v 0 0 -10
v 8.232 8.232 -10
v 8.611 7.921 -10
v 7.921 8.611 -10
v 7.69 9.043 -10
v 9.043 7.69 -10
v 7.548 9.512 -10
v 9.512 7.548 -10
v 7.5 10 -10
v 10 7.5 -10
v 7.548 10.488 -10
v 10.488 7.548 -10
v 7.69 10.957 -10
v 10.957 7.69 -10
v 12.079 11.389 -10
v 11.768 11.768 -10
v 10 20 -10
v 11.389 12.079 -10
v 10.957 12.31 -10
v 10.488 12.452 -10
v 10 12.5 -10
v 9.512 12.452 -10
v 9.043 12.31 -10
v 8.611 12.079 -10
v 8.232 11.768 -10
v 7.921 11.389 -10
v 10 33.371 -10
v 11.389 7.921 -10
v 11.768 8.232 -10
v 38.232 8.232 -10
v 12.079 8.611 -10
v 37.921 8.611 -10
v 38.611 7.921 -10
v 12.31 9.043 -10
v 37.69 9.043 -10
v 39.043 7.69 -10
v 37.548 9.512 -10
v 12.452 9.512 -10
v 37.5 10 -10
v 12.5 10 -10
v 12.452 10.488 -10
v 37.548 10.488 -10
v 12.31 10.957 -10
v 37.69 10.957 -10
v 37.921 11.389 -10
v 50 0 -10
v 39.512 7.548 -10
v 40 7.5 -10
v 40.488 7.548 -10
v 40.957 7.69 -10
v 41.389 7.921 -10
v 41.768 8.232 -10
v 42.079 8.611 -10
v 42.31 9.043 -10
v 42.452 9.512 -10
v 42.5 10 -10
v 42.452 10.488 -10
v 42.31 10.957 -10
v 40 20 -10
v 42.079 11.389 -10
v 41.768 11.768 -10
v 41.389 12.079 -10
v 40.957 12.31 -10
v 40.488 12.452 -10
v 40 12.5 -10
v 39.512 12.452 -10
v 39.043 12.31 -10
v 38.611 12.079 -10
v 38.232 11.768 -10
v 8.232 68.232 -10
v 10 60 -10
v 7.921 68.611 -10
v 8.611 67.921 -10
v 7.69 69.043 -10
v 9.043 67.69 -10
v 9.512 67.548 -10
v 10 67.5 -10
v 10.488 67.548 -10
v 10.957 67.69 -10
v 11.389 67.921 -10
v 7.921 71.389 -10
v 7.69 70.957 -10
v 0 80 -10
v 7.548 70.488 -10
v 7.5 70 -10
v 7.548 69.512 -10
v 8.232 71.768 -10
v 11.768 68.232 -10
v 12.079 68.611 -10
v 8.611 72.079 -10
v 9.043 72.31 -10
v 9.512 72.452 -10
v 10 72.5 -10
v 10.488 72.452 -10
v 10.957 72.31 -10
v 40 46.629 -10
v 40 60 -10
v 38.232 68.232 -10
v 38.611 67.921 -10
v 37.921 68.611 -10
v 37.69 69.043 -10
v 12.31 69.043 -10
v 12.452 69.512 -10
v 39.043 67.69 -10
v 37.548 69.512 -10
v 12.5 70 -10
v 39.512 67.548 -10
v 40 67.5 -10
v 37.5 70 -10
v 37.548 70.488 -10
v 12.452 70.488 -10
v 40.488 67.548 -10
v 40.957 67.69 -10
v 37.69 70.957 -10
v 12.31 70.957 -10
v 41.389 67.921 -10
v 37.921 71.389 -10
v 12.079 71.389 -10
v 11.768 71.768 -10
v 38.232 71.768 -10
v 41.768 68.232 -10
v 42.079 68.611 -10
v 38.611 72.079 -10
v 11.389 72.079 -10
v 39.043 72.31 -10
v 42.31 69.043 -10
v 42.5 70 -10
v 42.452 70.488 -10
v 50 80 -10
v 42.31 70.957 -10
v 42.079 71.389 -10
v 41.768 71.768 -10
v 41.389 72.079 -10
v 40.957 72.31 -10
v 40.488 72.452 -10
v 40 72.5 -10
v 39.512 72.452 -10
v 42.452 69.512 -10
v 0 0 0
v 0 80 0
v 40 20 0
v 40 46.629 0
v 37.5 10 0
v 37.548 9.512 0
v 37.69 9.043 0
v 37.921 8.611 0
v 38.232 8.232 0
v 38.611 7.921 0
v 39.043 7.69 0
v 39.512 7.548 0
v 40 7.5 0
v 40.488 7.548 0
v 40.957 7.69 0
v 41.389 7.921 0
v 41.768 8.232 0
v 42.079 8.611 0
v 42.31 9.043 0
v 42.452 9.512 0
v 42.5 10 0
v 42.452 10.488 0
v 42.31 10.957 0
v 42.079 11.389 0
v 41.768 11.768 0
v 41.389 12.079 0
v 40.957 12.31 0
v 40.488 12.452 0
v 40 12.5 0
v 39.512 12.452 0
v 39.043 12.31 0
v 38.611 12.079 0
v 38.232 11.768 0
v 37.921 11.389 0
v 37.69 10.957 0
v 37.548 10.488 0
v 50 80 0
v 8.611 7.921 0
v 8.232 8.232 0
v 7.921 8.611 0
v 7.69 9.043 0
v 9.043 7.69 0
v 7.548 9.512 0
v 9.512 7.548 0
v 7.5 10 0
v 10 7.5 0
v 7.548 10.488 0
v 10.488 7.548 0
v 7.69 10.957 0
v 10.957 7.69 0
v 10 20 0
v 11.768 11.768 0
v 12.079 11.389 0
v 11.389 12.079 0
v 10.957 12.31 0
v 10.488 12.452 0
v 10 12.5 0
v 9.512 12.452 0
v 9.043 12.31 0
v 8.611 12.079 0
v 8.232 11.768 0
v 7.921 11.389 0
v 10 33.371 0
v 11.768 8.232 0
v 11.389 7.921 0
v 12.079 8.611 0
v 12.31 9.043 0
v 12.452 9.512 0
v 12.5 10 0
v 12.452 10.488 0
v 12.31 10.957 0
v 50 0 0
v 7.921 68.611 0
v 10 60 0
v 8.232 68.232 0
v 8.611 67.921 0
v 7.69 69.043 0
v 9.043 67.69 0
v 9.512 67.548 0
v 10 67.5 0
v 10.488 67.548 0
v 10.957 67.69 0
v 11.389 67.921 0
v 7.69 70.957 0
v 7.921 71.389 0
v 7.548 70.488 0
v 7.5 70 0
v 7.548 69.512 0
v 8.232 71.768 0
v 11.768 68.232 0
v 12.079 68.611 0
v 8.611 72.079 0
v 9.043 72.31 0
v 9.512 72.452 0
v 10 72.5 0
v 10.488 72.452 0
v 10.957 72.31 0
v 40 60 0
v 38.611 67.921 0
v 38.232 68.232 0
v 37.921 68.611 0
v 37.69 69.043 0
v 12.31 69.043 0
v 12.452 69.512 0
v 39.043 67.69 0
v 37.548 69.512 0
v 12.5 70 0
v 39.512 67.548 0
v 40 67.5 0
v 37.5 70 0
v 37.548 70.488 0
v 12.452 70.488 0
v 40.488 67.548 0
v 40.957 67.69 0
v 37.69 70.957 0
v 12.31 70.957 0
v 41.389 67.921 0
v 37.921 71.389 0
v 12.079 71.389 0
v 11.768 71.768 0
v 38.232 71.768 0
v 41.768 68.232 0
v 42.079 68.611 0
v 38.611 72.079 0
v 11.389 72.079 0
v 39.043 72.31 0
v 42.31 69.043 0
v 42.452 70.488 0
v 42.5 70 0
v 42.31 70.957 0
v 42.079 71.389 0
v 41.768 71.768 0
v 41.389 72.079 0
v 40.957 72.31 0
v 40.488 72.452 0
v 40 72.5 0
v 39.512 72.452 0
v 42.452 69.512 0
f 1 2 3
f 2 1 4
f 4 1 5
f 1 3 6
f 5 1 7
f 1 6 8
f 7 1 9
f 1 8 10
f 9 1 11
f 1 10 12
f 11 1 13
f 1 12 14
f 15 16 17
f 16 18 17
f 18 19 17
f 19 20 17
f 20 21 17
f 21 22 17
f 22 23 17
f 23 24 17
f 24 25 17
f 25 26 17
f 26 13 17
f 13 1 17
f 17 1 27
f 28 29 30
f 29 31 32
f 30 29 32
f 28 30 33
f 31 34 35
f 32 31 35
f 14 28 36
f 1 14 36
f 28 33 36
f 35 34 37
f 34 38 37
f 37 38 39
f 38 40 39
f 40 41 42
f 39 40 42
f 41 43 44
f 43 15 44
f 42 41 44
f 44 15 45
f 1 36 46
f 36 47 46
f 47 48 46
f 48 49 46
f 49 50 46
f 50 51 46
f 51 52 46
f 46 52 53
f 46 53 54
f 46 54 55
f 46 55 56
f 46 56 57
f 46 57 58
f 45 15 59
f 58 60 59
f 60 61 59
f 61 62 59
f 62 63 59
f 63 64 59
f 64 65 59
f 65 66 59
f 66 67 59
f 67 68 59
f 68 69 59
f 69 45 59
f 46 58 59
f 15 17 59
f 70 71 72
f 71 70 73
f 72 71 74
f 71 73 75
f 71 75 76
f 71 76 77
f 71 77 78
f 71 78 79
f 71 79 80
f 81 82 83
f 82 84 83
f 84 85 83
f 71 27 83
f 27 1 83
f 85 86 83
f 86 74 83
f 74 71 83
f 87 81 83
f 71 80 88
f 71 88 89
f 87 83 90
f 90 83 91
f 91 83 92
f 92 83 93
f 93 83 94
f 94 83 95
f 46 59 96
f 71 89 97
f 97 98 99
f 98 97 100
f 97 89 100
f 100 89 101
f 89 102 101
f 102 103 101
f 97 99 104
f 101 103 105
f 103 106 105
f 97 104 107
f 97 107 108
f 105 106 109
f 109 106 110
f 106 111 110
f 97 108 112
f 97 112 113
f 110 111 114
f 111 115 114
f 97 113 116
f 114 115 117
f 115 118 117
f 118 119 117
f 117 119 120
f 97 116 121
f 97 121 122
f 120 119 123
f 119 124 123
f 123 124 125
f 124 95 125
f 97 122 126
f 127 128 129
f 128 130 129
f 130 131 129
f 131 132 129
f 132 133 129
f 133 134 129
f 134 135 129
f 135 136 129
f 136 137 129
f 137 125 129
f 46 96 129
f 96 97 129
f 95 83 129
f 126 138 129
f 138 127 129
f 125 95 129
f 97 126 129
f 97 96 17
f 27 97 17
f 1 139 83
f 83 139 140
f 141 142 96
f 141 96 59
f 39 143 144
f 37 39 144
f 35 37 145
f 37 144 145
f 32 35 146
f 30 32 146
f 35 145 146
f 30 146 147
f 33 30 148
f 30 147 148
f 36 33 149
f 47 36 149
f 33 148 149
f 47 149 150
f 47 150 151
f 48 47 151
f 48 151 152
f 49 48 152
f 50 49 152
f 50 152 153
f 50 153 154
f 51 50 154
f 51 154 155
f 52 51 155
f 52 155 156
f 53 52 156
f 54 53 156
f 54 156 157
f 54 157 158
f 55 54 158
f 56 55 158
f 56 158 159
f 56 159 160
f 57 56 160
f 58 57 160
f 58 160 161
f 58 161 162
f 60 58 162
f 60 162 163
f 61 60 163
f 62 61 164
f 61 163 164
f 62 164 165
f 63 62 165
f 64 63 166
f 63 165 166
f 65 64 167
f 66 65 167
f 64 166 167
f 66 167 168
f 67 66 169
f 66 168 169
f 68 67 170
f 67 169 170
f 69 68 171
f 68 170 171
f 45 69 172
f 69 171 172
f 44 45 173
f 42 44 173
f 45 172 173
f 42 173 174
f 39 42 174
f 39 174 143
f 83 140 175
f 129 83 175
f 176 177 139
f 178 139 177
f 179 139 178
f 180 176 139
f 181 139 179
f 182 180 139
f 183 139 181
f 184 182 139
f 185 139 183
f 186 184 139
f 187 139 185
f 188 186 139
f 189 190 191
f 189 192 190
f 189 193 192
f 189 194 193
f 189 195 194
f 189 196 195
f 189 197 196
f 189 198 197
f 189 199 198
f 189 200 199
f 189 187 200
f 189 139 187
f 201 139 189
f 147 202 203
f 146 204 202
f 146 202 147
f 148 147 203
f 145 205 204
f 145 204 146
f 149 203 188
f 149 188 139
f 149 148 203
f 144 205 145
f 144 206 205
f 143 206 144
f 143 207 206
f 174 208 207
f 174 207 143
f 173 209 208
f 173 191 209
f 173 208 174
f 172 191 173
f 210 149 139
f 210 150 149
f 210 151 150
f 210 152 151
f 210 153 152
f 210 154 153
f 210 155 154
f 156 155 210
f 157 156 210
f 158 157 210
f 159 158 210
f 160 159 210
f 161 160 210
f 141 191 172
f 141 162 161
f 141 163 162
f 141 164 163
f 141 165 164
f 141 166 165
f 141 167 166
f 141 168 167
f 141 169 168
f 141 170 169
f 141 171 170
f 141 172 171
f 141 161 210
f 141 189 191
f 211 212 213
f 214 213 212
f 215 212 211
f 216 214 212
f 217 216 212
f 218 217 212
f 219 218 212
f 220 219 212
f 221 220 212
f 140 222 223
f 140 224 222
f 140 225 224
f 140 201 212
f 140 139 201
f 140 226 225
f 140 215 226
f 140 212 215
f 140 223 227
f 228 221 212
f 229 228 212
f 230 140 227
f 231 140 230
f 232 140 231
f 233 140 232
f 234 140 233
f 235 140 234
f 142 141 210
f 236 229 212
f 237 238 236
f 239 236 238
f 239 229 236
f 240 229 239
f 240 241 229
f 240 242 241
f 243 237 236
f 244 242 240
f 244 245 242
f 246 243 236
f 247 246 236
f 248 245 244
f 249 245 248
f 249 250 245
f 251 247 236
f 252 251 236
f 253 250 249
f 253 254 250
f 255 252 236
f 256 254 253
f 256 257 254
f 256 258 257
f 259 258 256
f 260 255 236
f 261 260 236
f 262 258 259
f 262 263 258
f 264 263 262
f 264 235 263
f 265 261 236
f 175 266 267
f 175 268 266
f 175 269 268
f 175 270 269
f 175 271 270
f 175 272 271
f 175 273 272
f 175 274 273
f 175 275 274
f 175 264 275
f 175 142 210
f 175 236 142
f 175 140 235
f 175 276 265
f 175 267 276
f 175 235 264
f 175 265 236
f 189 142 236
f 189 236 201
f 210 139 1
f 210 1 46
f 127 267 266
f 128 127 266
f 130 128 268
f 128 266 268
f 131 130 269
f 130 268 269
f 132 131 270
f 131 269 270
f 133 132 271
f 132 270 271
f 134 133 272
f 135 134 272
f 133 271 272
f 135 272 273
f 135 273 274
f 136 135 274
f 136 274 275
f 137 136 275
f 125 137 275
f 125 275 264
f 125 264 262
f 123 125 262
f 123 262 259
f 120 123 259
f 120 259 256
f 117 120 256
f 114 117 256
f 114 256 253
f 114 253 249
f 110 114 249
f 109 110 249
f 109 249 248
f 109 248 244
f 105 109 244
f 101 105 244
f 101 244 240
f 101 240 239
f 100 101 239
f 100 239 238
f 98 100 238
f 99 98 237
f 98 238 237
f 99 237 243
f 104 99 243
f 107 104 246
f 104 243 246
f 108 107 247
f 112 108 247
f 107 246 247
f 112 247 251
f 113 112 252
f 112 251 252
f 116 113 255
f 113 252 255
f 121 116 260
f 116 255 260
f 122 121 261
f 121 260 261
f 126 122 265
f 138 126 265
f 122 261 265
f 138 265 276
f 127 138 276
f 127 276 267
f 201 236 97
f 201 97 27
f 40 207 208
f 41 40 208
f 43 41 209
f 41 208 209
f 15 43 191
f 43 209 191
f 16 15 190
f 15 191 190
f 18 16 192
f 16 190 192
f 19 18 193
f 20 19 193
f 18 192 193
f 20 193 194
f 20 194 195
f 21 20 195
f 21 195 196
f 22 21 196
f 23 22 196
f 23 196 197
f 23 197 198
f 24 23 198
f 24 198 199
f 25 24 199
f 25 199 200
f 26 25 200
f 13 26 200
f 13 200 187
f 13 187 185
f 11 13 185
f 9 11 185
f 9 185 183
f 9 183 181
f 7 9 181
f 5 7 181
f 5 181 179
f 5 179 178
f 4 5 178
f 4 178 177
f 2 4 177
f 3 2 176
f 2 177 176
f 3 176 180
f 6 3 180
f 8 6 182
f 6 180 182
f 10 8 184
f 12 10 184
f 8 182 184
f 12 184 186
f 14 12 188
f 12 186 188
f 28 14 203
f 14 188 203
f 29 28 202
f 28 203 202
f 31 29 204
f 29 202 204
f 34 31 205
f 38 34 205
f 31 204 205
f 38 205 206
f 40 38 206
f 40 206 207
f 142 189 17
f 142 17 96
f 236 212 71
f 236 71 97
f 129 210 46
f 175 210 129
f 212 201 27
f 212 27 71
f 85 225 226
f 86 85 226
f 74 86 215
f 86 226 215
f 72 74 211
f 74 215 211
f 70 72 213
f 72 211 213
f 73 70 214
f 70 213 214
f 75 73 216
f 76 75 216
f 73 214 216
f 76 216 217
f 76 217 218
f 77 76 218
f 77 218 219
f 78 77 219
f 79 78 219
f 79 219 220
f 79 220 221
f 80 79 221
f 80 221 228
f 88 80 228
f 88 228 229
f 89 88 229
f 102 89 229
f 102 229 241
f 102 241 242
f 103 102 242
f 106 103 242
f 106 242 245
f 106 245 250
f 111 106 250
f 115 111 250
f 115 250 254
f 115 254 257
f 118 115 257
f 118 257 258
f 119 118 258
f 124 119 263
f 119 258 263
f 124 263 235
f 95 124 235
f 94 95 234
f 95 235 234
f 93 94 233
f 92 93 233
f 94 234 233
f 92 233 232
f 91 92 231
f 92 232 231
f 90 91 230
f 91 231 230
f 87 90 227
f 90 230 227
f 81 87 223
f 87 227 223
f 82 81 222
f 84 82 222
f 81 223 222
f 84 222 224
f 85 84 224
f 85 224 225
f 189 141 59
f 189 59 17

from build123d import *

# Parameters (mm, degrees)
SKETCH1_W          = 50
SKETCH1_H          = 80
BASE_FLANGE1_DEPTH = 10
CUT_EXTRUDE1_REACH = 96.868
SKETCH6_R          = 2.5


# Sheet-metal steps are written as plain solids
with BuildPart() as part:
    # Sketch1 → Base-Flange1 (new body)
    with BuildSketch(Plane.XY):
        with Locations((25, 40)):
            Rectangle(SKETCH1_W, SKETCH1_H)
    extrude(amount=-BASE_FLANGE1_DEPTH)

    # Sketch6 → Cut-Extrude1 (cut, up to next)
    with BuildSketch(Plane.XY, mode=Mode.PRIVATE) as cut_extrude1_sk1:
        with Locations((40, 70)):
            Circle(SKETCH6_R)
    cut_extrude1_tool1 = extrude(cut_extrude1_sk1.sketch, amount=-CUT_EXTRUDE1_REACH, mode=Mode.PRIVATE) & part.part
    # Sketch6 → Cut-Extrude1 (cut, up to next)
    with BuildSketch(Plane.XY, mode=Mode.PRIVATE) as cut_extrude1_sk2:
        with Locations((10, 10)):
            Circle(SKETCH6_R)
    cut_extrude1_tool2 = extrude(cut_extrude1_sk2.sketch, amount=-CUT_EXTRUDE1_REACH, mode=Mode.PRIVATE) & part.part
    # Sketch6 → Cut-Extrude1 (cut, up to next)
    with BuildSketch(Plane.XY, mode=Mode.PRIVATE) as cut_extrude1_sk3:
        with Locations(Location((10, 70, 0), (0, 0, 180))):
            Circle(SKETCH6_R)
    cut_extrude1_tool3 = extrude(cut_extrude1_sk3.sketch, amount=-CUT_EXTRUDE1_REACH, mode=Mode.PRIVATE) & part.part
    # Sketch6 → Cut-Extrude1 (cut, up to next)
    with BuildSketch(Plane.XY, mode=Mode.PRIVATE) as cut_extrude1_sk4:
        with Locations(Location((40, 10, 0), (0, 0, 180))):
            Circle(SKETCH6_R)
    cut_extrude1_tool4 = extrude(cut_extrude1_sk4.sketch, amount=-CUT_EXTRUDE1_REACH, mode=Mode.PRIVATE) & part.part
    # Sketch6 → Cut-Extrude1 (cut, up to next)
    with BuildSketch(Plane.XY, mode=Mode.PRIVATE) as cut_extrude1_sk5:
        Polygon((40, 46.628826929), (40, 20), (10, 20), align=None)
    cut_extrude1_tool5 = extrude(cut_extrude1_sk5.sketch, amount=-CUT_EXTRUDE1_REACH, mode=Mode.PRIVATE) & part.part
    # Sketch6 → Cut-Extrude1 (cut, up to next)
    with BuildSketch(Plane.XY, mode=Mode.PRIVATE) as cut_extrude1_sk6:
        Polygon((40, 60), (10, 33.371173071), (10, 60), align=None)
    cut_extrude1_tool6 = extrude(cut_extrude1_sk6.sketch, amount=-CUT_EXTRUDE1_REACH, mode=Mode.PRIVATE) & part.part
    add(cut_extrude1_tool1.solids().sort_by_distance((40, 70, 0))[0], mode=Mode.SUBTRACT)
    add(cut_extrude1_tool2.solids().sort_by_distance((10, 10, 0))[0], mode=Mode.SUBTRACT)
    add(cut_extrude1_tool3.solids().sort_by_distance((10, 70, 0))[0], mode=Mode.SUBTRACT)
    add(cut_extrude1_tool4.solids().sort_by_distance((40, 10, 0))[0], mode=Mode.SUBTRACT)
    add(cut_extrude1_tool5.solids().sort_by_distance((30, 28.876276, 0))[0], mode=Mode.SUBTRACT)
    add(cut_extrude1_tool6.solids().sort_by_distance((20, 51.123724, 0))[0], mode=Mode.SUBTRACT)


solid = part.part
